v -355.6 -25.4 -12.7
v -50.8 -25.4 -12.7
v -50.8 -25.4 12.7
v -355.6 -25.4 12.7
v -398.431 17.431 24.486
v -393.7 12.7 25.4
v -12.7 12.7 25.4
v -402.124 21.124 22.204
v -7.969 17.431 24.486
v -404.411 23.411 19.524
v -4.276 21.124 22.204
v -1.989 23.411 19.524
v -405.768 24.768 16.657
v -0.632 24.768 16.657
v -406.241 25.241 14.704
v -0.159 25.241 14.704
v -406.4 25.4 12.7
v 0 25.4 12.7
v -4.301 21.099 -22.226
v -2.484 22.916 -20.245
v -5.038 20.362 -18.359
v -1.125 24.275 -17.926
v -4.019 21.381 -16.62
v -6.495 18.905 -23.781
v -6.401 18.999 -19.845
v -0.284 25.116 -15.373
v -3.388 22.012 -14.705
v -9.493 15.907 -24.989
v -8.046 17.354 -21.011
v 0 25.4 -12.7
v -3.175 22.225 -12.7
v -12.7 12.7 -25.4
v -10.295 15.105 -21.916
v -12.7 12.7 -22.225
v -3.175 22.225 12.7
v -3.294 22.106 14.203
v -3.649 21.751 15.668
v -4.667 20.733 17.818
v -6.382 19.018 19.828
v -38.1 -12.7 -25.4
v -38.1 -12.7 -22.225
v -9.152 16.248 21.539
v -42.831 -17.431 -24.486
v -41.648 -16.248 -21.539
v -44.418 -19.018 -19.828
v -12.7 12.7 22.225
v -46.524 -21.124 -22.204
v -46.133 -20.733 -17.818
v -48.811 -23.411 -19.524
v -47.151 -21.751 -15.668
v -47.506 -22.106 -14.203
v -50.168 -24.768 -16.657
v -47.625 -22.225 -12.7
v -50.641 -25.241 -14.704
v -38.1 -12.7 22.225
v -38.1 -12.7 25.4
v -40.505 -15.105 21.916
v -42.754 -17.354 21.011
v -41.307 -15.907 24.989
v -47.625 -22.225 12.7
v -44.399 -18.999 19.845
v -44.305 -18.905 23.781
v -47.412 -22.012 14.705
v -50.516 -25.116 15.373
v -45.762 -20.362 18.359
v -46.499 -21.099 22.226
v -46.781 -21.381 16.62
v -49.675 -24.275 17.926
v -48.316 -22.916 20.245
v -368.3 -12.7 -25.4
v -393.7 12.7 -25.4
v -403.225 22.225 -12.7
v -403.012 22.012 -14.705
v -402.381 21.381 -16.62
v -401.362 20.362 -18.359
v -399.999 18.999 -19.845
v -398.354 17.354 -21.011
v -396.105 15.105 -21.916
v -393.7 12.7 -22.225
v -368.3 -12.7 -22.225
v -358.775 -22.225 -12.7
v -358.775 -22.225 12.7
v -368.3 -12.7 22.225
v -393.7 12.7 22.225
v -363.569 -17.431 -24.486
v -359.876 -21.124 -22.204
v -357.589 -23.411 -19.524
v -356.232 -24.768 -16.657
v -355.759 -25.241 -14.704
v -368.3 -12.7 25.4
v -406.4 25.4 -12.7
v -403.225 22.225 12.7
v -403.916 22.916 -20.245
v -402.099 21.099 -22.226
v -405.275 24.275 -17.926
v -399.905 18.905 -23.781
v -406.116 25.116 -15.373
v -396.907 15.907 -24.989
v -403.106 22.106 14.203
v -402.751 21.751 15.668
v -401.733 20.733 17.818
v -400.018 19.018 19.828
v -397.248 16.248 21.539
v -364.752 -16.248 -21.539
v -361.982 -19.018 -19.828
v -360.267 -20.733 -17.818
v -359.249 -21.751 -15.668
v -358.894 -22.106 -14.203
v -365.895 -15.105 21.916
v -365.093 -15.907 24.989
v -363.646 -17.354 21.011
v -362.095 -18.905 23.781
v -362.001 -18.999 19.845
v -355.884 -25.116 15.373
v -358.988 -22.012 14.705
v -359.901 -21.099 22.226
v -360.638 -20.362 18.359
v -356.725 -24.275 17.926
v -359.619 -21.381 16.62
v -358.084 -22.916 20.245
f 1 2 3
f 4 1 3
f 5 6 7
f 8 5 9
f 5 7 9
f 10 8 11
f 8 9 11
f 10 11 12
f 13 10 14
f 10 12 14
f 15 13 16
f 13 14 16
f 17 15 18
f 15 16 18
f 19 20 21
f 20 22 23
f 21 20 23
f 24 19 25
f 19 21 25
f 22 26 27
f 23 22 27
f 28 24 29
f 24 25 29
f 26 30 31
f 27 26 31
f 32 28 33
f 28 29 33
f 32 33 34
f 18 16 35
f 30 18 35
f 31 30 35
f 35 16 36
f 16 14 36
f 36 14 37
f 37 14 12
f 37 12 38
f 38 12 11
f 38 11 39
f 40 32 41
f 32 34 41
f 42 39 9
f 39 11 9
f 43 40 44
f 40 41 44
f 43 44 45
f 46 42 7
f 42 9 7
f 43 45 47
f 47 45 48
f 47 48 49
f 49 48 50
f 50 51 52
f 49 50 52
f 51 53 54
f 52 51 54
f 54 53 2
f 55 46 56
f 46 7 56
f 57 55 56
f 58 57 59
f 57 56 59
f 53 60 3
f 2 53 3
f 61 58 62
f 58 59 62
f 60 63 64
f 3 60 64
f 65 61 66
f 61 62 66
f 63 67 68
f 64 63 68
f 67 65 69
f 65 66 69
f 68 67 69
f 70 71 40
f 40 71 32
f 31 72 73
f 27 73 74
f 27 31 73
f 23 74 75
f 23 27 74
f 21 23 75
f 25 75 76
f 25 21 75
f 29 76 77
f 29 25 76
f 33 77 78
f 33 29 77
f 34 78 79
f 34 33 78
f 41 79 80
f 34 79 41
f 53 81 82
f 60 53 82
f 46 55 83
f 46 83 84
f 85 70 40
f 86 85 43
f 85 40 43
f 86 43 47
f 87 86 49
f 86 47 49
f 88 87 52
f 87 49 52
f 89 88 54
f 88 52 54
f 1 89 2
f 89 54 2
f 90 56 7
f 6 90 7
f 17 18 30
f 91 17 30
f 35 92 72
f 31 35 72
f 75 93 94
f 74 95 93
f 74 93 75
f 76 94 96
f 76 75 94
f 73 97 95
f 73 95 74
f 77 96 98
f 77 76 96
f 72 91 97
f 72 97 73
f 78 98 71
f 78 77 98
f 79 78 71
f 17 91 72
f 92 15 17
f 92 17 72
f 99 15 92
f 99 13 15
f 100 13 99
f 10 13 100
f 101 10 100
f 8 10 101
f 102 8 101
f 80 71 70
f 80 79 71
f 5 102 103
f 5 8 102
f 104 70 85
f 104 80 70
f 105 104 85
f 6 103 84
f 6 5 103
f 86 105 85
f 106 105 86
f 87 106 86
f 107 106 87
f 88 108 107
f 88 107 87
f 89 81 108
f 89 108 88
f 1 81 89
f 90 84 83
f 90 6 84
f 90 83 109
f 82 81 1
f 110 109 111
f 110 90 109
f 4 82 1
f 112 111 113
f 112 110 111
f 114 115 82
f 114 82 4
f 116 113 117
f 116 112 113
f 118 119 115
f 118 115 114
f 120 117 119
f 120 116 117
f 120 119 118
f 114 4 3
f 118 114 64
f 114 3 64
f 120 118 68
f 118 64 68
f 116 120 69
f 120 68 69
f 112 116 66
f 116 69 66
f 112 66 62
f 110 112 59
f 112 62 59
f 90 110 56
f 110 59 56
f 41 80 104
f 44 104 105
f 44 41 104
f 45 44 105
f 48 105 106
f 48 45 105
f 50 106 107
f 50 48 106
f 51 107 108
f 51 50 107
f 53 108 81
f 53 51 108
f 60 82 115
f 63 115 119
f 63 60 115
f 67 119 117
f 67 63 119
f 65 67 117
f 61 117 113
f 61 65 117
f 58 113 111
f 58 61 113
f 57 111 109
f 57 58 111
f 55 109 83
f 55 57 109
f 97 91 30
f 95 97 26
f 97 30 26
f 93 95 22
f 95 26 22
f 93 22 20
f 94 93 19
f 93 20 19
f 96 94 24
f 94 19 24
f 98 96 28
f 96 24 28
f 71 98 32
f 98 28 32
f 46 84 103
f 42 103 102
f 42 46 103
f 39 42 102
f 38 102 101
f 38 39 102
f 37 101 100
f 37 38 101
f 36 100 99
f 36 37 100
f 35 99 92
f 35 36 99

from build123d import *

# Parameters (mm, degrees)
STRUCTURAL_MEMBER1_DEPTH = 406.4
CUT_EXTRUDE1_DEPTH       = 411.349558304


with BuildPart() as part:
    # Sketch11 → Structural Member1 (new body)
    with BuildSketch(Plane.ZY):
        with BuildLine():
            Line((-12.7, -25.4), (12.7, -25.4))
            ThreePointArc((12.7, -25.4), (21.680256121, -21.680256121), (25.4, -12.7))
            Line((25.4, -12.7), (25.4, 12.7))
            ThreePointArc((25.4, 12.7), (21.680256121, 21.680256121), (12.7, 25.4))
            Line((12.7, 25.4), (-12.7, 25.4))
            ThreePointArc((-12.7, 25.4), (-21.680256121, 21.680256121), (-25.4, 12.7))
            Line((-25.4, 12.7), (-25.4, -12.7))
            ThreePointArc((-25.4, -12.7), (-21.680256121, -21.680256121), (-12.7, -25.4))
        make_face()
        with BuildLine():
            Line((-12.7, -22.225), (12.7, -22.225))
            ThreePointArc((12.7, -22.225), (19.435192091, -19.435192091), (22.225, -12.7))
            Line((22.225, -12.7), (22.225, 12.7))
            ThreePointArc((22.225, 12.7), (19.435192091, 19.435192091), (12.7, 22.225))
            Line((12.7, 22.225), (-12.7, 22.225))
            ThreePointArc((-12.7, 22.225), (-19.435192091, 19.435192091), (-22.225, 12.7))
            Line((-22.225, 12.7), (-22.225, -12.7))
            ThreePointArc((-22.225, -12.7), (-19.435192091, -19.435192091), (-12.7, -22.225))
        make_face(mode=Mode.SUBTRACT)
    extrude(amount=STRUCTURAL_MEMBER1_DEPTH)

    # Sketch2 → Cut-Extrude1 (cut, through all)
    with BuildSketch(Plane.XY.offset(25.4)):
        Polygon((-406.4, 25.4), (-355.6, -25.4), (-406.4, -25.4), align=None)
        Polygon((0, 25.4), (-50.8, -25.4), (0, -25.4), align=None)
    extrude(amount=-CUT_EXTRUDE1_DEPTH, mode=Mode.SUBTRACT)


solid = part.part
